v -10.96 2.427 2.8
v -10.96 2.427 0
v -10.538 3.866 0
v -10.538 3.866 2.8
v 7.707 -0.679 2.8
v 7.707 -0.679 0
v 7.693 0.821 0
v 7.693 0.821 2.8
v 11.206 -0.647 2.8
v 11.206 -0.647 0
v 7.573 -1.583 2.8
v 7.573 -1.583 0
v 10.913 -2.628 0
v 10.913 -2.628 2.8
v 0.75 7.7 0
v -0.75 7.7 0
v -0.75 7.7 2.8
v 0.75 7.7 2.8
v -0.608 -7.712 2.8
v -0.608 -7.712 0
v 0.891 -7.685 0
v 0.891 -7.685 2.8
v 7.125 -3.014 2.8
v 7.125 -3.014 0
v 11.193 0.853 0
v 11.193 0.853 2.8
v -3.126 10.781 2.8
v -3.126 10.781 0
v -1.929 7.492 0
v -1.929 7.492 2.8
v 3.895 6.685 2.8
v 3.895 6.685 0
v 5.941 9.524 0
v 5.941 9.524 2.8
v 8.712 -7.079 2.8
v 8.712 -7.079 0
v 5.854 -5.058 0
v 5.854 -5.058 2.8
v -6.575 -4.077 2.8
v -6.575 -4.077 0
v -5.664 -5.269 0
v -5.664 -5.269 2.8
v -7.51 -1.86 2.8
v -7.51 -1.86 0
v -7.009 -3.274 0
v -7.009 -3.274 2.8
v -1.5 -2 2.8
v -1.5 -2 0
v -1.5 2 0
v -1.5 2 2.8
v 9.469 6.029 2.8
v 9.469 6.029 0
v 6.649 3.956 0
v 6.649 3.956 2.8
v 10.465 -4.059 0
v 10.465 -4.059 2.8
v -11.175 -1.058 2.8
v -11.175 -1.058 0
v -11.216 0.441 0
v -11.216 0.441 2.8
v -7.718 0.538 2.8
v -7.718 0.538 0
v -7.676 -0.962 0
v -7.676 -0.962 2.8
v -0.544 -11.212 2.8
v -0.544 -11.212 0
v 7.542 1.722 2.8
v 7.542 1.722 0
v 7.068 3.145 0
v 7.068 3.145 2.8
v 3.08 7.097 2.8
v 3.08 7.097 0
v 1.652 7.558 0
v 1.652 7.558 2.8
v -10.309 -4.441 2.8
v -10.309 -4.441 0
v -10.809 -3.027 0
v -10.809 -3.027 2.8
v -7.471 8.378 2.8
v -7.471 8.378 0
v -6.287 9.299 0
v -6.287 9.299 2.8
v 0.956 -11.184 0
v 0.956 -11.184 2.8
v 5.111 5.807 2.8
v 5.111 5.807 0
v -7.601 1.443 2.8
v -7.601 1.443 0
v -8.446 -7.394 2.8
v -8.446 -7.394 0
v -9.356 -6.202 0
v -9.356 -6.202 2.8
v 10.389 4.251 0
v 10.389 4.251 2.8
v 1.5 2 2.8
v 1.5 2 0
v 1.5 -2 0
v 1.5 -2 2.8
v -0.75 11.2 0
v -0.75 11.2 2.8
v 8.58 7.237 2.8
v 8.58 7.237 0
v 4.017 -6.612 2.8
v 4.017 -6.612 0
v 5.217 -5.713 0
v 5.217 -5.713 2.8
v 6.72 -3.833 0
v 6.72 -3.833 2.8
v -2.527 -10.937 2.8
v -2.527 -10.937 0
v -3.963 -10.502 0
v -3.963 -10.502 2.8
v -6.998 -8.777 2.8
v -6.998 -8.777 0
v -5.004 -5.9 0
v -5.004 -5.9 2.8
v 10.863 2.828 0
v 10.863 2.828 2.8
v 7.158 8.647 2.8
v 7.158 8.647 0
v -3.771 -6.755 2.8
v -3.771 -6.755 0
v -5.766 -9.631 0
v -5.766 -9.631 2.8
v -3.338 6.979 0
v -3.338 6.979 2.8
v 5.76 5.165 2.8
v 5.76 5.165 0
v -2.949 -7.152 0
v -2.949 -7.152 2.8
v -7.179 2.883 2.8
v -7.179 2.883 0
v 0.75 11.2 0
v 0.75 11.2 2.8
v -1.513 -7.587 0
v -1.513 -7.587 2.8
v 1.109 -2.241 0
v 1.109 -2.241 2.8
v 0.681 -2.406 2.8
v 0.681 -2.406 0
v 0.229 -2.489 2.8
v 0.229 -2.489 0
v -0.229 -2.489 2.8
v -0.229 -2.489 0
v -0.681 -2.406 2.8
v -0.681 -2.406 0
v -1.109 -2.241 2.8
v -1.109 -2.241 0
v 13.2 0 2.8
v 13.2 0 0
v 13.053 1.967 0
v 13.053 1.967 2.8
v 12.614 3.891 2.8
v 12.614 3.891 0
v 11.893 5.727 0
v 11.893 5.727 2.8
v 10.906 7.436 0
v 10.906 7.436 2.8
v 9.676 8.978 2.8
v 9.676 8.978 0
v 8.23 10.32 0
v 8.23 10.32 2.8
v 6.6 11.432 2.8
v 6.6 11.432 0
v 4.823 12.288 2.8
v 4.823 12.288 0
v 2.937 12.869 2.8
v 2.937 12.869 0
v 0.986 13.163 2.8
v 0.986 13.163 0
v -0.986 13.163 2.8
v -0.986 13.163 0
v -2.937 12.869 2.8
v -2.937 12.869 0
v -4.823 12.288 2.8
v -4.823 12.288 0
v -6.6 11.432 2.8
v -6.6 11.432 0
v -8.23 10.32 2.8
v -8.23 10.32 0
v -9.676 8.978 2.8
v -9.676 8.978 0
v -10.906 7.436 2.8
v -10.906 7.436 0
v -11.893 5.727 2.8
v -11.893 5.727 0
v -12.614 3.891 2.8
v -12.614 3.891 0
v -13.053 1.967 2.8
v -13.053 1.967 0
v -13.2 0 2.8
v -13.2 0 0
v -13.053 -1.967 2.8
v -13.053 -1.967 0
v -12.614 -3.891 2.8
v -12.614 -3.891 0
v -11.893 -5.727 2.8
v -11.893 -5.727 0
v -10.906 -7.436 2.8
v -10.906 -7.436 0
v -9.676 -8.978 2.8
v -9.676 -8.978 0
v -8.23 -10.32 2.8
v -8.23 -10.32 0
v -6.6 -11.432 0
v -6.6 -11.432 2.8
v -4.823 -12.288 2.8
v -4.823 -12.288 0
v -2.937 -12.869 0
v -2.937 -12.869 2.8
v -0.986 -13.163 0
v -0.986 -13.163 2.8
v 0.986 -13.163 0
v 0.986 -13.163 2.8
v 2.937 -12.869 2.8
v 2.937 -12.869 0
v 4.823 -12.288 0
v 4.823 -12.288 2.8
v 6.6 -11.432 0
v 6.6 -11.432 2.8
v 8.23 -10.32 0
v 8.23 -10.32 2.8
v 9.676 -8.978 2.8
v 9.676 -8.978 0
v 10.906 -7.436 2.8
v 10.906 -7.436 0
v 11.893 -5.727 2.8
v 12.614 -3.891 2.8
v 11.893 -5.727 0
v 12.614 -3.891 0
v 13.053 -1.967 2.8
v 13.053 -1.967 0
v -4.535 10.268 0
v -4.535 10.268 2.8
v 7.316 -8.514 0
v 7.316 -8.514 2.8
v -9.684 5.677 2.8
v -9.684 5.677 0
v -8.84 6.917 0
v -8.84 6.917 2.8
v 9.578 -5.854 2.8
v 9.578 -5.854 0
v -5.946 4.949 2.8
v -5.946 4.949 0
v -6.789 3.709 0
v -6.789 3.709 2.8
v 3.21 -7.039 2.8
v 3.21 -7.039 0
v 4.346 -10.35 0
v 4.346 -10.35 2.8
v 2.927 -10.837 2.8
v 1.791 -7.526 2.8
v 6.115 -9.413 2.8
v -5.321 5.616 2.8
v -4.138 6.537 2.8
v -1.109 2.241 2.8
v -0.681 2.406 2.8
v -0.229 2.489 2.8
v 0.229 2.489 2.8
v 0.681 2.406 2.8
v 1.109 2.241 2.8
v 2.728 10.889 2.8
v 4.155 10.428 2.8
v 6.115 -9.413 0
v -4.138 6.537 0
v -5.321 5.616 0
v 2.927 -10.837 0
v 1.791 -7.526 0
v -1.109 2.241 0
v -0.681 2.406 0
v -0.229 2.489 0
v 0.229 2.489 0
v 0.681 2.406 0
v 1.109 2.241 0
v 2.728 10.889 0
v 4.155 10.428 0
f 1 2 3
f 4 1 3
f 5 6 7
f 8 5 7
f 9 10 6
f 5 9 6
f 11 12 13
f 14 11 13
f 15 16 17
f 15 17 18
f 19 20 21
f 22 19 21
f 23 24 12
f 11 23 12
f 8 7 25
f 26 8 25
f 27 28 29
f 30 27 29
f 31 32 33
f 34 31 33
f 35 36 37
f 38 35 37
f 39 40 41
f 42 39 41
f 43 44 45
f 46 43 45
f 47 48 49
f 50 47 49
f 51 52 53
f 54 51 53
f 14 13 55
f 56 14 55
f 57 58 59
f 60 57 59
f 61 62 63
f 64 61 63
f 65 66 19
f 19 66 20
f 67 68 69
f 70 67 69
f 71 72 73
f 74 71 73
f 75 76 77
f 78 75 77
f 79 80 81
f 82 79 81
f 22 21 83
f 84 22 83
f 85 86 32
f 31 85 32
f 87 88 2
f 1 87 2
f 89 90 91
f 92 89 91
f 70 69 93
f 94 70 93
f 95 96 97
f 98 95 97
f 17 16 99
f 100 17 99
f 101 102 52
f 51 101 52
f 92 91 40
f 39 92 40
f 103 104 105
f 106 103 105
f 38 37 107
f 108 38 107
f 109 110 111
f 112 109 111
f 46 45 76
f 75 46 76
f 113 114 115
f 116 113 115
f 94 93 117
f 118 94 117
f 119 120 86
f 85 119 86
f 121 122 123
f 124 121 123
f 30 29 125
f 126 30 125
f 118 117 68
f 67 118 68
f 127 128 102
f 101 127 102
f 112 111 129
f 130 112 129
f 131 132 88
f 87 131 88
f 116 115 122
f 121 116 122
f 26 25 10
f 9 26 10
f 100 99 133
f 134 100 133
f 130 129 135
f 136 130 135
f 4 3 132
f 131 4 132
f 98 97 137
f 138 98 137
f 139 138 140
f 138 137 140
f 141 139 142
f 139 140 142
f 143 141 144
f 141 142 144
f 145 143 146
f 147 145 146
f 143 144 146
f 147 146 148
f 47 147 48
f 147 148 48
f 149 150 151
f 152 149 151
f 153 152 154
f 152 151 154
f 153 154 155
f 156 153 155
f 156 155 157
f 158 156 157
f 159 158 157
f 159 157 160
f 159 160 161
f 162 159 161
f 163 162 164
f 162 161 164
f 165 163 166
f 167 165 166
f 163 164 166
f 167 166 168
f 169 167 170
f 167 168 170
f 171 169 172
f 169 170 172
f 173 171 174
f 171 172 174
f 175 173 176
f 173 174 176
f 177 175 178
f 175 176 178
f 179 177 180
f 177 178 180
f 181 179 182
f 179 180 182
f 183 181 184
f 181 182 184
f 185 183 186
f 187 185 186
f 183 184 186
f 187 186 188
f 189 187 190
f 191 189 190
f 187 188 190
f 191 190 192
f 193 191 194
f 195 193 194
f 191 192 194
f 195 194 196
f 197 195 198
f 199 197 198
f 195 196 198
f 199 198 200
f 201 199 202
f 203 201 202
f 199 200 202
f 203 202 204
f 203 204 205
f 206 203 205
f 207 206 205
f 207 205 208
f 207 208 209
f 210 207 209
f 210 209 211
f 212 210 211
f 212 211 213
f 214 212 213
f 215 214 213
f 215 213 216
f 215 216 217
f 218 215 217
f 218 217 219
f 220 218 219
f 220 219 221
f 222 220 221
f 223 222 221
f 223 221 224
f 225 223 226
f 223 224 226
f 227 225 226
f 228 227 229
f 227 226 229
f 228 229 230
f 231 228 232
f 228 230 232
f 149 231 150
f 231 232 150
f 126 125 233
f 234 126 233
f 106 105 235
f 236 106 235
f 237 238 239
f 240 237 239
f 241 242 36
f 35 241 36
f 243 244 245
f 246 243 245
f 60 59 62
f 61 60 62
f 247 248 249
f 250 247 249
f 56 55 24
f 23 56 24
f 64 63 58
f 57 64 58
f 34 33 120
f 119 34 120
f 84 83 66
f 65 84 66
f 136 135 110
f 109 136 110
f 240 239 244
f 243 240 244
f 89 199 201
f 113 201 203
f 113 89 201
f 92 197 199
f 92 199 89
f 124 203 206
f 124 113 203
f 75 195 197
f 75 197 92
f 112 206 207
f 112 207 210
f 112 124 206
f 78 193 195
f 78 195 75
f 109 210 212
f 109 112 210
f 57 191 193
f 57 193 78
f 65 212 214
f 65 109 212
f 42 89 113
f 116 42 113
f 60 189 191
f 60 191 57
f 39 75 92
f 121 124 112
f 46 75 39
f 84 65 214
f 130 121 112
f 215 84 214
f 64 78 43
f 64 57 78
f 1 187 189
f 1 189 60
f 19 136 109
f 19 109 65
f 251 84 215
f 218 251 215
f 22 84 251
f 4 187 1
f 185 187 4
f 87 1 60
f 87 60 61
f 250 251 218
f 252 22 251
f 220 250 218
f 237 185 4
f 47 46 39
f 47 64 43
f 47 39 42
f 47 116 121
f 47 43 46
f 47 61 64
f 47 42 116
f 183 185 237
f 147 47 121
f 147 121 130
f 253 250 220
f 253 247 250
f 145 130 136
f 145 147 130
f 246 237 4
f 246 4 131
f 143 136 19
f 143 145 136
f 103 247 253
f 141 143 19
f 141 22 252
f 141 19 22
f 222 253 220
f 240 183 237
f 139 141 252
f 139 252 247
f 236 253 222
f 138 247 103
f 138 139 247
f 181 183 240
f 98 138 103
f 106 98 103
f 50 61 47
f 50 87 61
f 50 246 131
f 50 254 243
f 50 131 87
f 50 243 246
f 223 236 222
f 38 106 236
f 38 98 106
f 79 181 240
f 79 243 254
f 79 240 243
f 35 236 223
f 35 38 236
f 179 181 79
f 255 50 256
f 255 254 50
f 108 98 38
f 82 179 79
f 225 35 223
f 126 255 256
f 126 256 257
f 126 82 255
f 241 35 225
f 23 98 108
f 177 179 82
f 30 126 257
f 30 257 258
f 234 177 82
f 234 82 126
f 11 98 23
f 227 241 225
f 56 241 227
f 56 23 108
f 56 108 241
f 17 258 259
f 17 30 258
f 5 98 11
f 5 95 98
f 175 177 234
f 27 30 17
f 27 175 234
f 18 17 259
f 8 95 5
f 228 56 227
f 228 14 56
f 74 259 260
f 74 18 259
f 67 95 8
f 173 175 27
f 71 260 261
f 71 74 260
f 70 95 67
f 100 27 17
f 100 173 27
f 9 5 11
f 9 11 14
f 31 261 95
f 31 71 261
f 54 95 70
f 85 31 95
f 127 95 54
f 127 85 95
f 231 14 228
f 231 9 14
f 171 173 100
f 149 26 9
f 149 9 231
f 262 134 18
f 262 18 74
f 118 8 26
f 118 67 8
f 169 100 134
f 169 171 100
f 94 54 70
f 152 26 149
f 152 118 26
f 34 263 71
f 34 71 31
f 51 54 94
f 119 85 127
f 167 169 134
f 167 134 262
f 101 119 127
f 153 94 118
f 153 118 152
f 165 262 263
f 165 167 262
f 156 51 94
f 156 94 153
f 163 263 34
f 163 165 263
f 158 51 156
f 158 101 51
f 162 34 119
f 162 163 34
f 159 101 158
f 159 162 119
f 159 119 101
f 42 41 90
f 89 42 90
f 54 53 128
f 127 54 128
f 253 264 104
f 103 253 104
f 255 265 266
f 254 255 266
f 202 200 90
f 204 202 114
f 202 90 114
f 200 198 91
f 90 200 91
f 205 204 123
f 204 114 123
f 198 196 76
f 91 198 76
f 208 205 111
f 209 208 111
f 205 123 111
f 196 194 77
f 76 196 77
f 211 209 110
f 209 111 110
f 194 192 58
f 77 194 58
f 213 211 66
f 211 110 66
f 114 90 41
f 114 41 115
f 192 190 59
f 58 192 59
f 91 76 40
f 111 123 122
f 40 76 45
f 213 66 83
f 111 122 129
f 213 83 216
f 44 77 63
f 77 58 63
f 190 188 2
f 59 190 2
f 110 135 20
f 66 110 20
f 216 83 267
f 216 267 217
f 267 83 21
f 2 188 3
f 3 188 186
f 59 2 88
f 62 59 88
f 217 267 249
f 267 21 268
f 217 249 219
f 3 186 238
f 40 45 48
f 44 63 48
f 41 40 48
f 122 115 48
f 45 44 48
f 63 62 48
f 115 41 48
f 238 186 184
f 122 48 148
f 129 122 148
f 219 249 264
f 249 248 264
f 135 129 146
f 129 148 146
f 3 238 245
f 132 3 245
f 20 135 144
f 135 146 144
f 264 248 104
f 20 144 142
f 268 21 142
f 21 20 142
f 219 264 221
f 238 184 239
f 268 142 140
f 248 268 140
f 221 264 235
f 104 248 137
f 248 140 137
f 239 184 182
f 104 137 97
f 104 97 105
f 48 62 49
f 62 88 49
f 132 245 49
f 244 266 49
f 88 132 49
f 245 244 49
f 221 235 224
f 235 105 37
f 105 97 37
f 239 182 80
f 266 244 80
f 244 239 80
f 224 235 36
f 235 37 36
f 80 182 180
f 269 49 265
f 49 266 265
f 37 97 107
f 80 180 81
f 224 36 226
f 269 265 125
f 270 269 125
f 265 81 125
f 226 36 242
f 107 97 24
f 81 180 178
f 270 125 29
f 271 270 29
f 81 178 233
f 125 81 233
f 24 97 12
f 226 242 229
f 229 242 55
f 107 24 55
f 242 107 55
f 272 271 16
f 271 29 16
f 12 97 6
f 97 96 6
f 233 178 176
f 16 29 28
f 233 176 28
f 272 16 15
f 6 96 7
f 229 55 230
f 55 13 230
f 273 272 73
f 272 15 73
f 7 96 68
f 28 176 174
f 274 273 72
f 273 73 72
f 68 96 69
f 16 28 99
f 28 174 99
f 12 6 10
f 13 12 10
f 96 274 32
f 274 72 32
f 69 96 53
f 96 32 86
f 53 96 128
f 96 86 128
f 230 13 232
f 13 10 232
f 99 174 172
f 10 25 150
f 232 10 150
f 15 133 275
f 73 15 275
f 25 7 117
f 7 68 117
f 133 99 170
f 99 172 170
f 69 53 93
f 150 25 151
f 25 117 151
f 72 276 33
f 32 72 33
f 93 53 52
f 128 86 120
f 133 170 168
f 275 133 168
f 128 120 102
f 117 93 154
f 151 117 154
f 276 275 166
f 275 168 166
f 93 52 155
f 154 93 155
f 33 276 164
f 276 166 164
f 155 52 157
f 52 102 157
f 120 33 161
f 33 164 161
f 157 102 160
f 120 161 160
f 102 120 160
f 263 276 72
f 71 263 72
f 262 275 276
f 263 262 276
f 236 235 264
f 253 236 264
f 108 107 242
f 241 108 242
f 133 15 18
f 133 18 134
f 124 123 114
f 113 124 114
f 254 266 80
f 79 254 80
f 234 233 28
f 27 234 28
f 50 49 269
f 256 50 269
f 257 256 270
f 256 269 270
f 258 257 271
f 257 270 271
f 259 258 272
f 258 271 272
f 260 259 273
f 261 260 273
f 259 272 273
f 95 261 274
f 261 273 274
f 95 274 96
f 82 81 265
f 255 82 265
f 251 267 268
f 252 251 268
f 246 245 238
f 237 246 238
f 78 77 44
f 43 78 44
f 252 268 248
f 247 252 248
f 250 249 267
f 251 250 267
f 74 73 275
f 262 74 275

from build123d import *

# Parameters (mm, degrees)
F0_R     = 13.2
F0_W     = 1.5
F0_H     = 3.5
F1_DEPTH = 2.8


with BuildPart() as f1:
    # F0 (on Top) → F1 (new body)
    with BuildSketch(Plane.XY):
        Circle(F0_R)
        Polygon((-5.765517, -9.631268), (-6.998184, -8.776555), (-5.003855, -5.900333), (-3.771189, -6.755045), align=None, mode=Mode.SUBTRACT)
        Polygon((-2.527204, -10.936898), (-3.962865, -10.502295), (-2.948791, -7.152421), (-1.513131, -7.587024), align=None, mode=Mode.SUBTRACT)
        Polygon((-8.445988, -7.393766), (-9.356395, -6.201643), (-6.574773, -4.07736), (-5.664366, -5.269484), align=None, mode=Mode.SUBTRACT)
        Polygon((-10.30927, -4.440883), (-10.809331, -3.026691), (-7.50955, -1.859883), (-7.009489, -3.274075), align=None, mode=Mode.SUBTRACT)
        Polygon((-11.175082, -1.058324), (-11.216413, 0.441107), (-7.717742, 0.537547), (-7.676411, -0.961884), align=None, mode=Mode.SUBTRACT)
        Polygon((0.955627, -11.184332), (-0.54412, -11.211888), (-0.608418, -7.712479), (0.891329, -7.684922), align=None, mode=Mode.SUBTRACT)
        Polygon((4.345997, -10.349629), (2.927271, -10.836678), (1.790823, -7.526317), (3.209549, -7.039268), align=None, mode=Mode.SUBTRACT)
        Polygon((7.315871, -8.51355), (6.115435, -9.412968), (4.016793, -6.611949), (5.21723, -5.712531), align=None, mode=Mode.SUBTRACT)
        Polygon((9.5779, -5.853745), (8.711901, -7.078508), (5.85412, -5.057844), (6.720119, -3.83308), align=None, mode=Mode.SUBTRACT)
        Polygon((10.913222, -2.627562), (10.46545, -4.05917), (7.125032, -3.014368), (7.572805, -1.58276), align=None, mode=Mode.SUBTRACT)
        Polygon((-10.959651, 2.426634), (-10.538254, 3.866225), (-7.179207, 2.882966), (-7.600603, 1.443374), align=None, mode=Mode.SUBTRACT)
        Polygon((-9.683822, 5.676803), (-8.840469, 6.917269), (-5.946049, 4.949445), (-6.789402, 3.708979), align=None, mode=Mode.SUBTRACT)
        Polygon((-7.471038, 8.377714), (-6.287327, 9.299033), (-4.137583, 6.537041), (-5.321293, 5.615722), align=None, mode=Mode.SUBTRACT)
        Polygon((-4.535395, 10.268042), (-3.125856, 10.781072), (-1.928786, 7.492148), (-3.338325, 6.979118), align=None, mode=Mode.SUBTRACT)
        with BuildLine():
            ThreePointArc((1.5, 2), (2.236068, 1.118034), (2.5, 0))
            ThreePointArc((2.5, 0), (2.236068, -1.118034), (1.5, -2))
            ThreePointArc((1.5, -2), (0, -2.5), (-1.5, -2))
            ThreePointArc((-1.5, -2), (-2.5, 0), (-1.5, 2))
            ThreePointArc((-1.5, 2), (0, 2.5), (1.5, 2))
        make_face(mode=Mode.SUBTRACT)
        Polygon((11.192638, 0.852849), (11.206417, -0.647087), (7.706564, -0.679238), (7.692786, 0.820699), align=None, mode=Mode.SUBTRACT)
        Polygon((10.389113, 4.250744), (10.86311, 2.827604), (7.54245, 1.721612), (7.068453, 3.144752), align=None, mode=Mode.SUBTRACT)
        Polygon((8.580393, 7.237359), (9.468746, 6.028711), (6.648568, 3.955888), (5.760215, 5.164535), align=None, mode=Mode.SUBTRACT)
        with Locations((0, 9.45)):
            Rectangle(F0_W, F0_H, mode=Mode.SUBTRACT)
        Polygon((2.727698, 10.888625), (4.155132, 10.427722), (3.07969, 7.097042), (1.652256, 7.557946), align=None, mode=Mode.SUBTRACT)
        Polygon((5.941479, 9.523725), (7.158235, 8.646512), (5.111405, 5.807412), (3.894648, 6.684625), align=None, mode=Mode.SUBTRACT)
        with BuildLine():
            Line((-1.5, -2), (-1.5, 2))
            ThreePointArc((-1.5, 2), (-2.5, 0), (-1.5, -2))
        make_face()
        with BuildLine():
            ThreePointArc((1.5, -2), (2.236068, -1.118034), (2.5, 0))
            ThreePointArc((2.5, 0), (2.236068, 1.118034), (1.5, 2))
            Line((1.5, 2), (1.5, -2))
        make_face()
    extrude(amount=F1_DEPTH)


solid = f1.part
